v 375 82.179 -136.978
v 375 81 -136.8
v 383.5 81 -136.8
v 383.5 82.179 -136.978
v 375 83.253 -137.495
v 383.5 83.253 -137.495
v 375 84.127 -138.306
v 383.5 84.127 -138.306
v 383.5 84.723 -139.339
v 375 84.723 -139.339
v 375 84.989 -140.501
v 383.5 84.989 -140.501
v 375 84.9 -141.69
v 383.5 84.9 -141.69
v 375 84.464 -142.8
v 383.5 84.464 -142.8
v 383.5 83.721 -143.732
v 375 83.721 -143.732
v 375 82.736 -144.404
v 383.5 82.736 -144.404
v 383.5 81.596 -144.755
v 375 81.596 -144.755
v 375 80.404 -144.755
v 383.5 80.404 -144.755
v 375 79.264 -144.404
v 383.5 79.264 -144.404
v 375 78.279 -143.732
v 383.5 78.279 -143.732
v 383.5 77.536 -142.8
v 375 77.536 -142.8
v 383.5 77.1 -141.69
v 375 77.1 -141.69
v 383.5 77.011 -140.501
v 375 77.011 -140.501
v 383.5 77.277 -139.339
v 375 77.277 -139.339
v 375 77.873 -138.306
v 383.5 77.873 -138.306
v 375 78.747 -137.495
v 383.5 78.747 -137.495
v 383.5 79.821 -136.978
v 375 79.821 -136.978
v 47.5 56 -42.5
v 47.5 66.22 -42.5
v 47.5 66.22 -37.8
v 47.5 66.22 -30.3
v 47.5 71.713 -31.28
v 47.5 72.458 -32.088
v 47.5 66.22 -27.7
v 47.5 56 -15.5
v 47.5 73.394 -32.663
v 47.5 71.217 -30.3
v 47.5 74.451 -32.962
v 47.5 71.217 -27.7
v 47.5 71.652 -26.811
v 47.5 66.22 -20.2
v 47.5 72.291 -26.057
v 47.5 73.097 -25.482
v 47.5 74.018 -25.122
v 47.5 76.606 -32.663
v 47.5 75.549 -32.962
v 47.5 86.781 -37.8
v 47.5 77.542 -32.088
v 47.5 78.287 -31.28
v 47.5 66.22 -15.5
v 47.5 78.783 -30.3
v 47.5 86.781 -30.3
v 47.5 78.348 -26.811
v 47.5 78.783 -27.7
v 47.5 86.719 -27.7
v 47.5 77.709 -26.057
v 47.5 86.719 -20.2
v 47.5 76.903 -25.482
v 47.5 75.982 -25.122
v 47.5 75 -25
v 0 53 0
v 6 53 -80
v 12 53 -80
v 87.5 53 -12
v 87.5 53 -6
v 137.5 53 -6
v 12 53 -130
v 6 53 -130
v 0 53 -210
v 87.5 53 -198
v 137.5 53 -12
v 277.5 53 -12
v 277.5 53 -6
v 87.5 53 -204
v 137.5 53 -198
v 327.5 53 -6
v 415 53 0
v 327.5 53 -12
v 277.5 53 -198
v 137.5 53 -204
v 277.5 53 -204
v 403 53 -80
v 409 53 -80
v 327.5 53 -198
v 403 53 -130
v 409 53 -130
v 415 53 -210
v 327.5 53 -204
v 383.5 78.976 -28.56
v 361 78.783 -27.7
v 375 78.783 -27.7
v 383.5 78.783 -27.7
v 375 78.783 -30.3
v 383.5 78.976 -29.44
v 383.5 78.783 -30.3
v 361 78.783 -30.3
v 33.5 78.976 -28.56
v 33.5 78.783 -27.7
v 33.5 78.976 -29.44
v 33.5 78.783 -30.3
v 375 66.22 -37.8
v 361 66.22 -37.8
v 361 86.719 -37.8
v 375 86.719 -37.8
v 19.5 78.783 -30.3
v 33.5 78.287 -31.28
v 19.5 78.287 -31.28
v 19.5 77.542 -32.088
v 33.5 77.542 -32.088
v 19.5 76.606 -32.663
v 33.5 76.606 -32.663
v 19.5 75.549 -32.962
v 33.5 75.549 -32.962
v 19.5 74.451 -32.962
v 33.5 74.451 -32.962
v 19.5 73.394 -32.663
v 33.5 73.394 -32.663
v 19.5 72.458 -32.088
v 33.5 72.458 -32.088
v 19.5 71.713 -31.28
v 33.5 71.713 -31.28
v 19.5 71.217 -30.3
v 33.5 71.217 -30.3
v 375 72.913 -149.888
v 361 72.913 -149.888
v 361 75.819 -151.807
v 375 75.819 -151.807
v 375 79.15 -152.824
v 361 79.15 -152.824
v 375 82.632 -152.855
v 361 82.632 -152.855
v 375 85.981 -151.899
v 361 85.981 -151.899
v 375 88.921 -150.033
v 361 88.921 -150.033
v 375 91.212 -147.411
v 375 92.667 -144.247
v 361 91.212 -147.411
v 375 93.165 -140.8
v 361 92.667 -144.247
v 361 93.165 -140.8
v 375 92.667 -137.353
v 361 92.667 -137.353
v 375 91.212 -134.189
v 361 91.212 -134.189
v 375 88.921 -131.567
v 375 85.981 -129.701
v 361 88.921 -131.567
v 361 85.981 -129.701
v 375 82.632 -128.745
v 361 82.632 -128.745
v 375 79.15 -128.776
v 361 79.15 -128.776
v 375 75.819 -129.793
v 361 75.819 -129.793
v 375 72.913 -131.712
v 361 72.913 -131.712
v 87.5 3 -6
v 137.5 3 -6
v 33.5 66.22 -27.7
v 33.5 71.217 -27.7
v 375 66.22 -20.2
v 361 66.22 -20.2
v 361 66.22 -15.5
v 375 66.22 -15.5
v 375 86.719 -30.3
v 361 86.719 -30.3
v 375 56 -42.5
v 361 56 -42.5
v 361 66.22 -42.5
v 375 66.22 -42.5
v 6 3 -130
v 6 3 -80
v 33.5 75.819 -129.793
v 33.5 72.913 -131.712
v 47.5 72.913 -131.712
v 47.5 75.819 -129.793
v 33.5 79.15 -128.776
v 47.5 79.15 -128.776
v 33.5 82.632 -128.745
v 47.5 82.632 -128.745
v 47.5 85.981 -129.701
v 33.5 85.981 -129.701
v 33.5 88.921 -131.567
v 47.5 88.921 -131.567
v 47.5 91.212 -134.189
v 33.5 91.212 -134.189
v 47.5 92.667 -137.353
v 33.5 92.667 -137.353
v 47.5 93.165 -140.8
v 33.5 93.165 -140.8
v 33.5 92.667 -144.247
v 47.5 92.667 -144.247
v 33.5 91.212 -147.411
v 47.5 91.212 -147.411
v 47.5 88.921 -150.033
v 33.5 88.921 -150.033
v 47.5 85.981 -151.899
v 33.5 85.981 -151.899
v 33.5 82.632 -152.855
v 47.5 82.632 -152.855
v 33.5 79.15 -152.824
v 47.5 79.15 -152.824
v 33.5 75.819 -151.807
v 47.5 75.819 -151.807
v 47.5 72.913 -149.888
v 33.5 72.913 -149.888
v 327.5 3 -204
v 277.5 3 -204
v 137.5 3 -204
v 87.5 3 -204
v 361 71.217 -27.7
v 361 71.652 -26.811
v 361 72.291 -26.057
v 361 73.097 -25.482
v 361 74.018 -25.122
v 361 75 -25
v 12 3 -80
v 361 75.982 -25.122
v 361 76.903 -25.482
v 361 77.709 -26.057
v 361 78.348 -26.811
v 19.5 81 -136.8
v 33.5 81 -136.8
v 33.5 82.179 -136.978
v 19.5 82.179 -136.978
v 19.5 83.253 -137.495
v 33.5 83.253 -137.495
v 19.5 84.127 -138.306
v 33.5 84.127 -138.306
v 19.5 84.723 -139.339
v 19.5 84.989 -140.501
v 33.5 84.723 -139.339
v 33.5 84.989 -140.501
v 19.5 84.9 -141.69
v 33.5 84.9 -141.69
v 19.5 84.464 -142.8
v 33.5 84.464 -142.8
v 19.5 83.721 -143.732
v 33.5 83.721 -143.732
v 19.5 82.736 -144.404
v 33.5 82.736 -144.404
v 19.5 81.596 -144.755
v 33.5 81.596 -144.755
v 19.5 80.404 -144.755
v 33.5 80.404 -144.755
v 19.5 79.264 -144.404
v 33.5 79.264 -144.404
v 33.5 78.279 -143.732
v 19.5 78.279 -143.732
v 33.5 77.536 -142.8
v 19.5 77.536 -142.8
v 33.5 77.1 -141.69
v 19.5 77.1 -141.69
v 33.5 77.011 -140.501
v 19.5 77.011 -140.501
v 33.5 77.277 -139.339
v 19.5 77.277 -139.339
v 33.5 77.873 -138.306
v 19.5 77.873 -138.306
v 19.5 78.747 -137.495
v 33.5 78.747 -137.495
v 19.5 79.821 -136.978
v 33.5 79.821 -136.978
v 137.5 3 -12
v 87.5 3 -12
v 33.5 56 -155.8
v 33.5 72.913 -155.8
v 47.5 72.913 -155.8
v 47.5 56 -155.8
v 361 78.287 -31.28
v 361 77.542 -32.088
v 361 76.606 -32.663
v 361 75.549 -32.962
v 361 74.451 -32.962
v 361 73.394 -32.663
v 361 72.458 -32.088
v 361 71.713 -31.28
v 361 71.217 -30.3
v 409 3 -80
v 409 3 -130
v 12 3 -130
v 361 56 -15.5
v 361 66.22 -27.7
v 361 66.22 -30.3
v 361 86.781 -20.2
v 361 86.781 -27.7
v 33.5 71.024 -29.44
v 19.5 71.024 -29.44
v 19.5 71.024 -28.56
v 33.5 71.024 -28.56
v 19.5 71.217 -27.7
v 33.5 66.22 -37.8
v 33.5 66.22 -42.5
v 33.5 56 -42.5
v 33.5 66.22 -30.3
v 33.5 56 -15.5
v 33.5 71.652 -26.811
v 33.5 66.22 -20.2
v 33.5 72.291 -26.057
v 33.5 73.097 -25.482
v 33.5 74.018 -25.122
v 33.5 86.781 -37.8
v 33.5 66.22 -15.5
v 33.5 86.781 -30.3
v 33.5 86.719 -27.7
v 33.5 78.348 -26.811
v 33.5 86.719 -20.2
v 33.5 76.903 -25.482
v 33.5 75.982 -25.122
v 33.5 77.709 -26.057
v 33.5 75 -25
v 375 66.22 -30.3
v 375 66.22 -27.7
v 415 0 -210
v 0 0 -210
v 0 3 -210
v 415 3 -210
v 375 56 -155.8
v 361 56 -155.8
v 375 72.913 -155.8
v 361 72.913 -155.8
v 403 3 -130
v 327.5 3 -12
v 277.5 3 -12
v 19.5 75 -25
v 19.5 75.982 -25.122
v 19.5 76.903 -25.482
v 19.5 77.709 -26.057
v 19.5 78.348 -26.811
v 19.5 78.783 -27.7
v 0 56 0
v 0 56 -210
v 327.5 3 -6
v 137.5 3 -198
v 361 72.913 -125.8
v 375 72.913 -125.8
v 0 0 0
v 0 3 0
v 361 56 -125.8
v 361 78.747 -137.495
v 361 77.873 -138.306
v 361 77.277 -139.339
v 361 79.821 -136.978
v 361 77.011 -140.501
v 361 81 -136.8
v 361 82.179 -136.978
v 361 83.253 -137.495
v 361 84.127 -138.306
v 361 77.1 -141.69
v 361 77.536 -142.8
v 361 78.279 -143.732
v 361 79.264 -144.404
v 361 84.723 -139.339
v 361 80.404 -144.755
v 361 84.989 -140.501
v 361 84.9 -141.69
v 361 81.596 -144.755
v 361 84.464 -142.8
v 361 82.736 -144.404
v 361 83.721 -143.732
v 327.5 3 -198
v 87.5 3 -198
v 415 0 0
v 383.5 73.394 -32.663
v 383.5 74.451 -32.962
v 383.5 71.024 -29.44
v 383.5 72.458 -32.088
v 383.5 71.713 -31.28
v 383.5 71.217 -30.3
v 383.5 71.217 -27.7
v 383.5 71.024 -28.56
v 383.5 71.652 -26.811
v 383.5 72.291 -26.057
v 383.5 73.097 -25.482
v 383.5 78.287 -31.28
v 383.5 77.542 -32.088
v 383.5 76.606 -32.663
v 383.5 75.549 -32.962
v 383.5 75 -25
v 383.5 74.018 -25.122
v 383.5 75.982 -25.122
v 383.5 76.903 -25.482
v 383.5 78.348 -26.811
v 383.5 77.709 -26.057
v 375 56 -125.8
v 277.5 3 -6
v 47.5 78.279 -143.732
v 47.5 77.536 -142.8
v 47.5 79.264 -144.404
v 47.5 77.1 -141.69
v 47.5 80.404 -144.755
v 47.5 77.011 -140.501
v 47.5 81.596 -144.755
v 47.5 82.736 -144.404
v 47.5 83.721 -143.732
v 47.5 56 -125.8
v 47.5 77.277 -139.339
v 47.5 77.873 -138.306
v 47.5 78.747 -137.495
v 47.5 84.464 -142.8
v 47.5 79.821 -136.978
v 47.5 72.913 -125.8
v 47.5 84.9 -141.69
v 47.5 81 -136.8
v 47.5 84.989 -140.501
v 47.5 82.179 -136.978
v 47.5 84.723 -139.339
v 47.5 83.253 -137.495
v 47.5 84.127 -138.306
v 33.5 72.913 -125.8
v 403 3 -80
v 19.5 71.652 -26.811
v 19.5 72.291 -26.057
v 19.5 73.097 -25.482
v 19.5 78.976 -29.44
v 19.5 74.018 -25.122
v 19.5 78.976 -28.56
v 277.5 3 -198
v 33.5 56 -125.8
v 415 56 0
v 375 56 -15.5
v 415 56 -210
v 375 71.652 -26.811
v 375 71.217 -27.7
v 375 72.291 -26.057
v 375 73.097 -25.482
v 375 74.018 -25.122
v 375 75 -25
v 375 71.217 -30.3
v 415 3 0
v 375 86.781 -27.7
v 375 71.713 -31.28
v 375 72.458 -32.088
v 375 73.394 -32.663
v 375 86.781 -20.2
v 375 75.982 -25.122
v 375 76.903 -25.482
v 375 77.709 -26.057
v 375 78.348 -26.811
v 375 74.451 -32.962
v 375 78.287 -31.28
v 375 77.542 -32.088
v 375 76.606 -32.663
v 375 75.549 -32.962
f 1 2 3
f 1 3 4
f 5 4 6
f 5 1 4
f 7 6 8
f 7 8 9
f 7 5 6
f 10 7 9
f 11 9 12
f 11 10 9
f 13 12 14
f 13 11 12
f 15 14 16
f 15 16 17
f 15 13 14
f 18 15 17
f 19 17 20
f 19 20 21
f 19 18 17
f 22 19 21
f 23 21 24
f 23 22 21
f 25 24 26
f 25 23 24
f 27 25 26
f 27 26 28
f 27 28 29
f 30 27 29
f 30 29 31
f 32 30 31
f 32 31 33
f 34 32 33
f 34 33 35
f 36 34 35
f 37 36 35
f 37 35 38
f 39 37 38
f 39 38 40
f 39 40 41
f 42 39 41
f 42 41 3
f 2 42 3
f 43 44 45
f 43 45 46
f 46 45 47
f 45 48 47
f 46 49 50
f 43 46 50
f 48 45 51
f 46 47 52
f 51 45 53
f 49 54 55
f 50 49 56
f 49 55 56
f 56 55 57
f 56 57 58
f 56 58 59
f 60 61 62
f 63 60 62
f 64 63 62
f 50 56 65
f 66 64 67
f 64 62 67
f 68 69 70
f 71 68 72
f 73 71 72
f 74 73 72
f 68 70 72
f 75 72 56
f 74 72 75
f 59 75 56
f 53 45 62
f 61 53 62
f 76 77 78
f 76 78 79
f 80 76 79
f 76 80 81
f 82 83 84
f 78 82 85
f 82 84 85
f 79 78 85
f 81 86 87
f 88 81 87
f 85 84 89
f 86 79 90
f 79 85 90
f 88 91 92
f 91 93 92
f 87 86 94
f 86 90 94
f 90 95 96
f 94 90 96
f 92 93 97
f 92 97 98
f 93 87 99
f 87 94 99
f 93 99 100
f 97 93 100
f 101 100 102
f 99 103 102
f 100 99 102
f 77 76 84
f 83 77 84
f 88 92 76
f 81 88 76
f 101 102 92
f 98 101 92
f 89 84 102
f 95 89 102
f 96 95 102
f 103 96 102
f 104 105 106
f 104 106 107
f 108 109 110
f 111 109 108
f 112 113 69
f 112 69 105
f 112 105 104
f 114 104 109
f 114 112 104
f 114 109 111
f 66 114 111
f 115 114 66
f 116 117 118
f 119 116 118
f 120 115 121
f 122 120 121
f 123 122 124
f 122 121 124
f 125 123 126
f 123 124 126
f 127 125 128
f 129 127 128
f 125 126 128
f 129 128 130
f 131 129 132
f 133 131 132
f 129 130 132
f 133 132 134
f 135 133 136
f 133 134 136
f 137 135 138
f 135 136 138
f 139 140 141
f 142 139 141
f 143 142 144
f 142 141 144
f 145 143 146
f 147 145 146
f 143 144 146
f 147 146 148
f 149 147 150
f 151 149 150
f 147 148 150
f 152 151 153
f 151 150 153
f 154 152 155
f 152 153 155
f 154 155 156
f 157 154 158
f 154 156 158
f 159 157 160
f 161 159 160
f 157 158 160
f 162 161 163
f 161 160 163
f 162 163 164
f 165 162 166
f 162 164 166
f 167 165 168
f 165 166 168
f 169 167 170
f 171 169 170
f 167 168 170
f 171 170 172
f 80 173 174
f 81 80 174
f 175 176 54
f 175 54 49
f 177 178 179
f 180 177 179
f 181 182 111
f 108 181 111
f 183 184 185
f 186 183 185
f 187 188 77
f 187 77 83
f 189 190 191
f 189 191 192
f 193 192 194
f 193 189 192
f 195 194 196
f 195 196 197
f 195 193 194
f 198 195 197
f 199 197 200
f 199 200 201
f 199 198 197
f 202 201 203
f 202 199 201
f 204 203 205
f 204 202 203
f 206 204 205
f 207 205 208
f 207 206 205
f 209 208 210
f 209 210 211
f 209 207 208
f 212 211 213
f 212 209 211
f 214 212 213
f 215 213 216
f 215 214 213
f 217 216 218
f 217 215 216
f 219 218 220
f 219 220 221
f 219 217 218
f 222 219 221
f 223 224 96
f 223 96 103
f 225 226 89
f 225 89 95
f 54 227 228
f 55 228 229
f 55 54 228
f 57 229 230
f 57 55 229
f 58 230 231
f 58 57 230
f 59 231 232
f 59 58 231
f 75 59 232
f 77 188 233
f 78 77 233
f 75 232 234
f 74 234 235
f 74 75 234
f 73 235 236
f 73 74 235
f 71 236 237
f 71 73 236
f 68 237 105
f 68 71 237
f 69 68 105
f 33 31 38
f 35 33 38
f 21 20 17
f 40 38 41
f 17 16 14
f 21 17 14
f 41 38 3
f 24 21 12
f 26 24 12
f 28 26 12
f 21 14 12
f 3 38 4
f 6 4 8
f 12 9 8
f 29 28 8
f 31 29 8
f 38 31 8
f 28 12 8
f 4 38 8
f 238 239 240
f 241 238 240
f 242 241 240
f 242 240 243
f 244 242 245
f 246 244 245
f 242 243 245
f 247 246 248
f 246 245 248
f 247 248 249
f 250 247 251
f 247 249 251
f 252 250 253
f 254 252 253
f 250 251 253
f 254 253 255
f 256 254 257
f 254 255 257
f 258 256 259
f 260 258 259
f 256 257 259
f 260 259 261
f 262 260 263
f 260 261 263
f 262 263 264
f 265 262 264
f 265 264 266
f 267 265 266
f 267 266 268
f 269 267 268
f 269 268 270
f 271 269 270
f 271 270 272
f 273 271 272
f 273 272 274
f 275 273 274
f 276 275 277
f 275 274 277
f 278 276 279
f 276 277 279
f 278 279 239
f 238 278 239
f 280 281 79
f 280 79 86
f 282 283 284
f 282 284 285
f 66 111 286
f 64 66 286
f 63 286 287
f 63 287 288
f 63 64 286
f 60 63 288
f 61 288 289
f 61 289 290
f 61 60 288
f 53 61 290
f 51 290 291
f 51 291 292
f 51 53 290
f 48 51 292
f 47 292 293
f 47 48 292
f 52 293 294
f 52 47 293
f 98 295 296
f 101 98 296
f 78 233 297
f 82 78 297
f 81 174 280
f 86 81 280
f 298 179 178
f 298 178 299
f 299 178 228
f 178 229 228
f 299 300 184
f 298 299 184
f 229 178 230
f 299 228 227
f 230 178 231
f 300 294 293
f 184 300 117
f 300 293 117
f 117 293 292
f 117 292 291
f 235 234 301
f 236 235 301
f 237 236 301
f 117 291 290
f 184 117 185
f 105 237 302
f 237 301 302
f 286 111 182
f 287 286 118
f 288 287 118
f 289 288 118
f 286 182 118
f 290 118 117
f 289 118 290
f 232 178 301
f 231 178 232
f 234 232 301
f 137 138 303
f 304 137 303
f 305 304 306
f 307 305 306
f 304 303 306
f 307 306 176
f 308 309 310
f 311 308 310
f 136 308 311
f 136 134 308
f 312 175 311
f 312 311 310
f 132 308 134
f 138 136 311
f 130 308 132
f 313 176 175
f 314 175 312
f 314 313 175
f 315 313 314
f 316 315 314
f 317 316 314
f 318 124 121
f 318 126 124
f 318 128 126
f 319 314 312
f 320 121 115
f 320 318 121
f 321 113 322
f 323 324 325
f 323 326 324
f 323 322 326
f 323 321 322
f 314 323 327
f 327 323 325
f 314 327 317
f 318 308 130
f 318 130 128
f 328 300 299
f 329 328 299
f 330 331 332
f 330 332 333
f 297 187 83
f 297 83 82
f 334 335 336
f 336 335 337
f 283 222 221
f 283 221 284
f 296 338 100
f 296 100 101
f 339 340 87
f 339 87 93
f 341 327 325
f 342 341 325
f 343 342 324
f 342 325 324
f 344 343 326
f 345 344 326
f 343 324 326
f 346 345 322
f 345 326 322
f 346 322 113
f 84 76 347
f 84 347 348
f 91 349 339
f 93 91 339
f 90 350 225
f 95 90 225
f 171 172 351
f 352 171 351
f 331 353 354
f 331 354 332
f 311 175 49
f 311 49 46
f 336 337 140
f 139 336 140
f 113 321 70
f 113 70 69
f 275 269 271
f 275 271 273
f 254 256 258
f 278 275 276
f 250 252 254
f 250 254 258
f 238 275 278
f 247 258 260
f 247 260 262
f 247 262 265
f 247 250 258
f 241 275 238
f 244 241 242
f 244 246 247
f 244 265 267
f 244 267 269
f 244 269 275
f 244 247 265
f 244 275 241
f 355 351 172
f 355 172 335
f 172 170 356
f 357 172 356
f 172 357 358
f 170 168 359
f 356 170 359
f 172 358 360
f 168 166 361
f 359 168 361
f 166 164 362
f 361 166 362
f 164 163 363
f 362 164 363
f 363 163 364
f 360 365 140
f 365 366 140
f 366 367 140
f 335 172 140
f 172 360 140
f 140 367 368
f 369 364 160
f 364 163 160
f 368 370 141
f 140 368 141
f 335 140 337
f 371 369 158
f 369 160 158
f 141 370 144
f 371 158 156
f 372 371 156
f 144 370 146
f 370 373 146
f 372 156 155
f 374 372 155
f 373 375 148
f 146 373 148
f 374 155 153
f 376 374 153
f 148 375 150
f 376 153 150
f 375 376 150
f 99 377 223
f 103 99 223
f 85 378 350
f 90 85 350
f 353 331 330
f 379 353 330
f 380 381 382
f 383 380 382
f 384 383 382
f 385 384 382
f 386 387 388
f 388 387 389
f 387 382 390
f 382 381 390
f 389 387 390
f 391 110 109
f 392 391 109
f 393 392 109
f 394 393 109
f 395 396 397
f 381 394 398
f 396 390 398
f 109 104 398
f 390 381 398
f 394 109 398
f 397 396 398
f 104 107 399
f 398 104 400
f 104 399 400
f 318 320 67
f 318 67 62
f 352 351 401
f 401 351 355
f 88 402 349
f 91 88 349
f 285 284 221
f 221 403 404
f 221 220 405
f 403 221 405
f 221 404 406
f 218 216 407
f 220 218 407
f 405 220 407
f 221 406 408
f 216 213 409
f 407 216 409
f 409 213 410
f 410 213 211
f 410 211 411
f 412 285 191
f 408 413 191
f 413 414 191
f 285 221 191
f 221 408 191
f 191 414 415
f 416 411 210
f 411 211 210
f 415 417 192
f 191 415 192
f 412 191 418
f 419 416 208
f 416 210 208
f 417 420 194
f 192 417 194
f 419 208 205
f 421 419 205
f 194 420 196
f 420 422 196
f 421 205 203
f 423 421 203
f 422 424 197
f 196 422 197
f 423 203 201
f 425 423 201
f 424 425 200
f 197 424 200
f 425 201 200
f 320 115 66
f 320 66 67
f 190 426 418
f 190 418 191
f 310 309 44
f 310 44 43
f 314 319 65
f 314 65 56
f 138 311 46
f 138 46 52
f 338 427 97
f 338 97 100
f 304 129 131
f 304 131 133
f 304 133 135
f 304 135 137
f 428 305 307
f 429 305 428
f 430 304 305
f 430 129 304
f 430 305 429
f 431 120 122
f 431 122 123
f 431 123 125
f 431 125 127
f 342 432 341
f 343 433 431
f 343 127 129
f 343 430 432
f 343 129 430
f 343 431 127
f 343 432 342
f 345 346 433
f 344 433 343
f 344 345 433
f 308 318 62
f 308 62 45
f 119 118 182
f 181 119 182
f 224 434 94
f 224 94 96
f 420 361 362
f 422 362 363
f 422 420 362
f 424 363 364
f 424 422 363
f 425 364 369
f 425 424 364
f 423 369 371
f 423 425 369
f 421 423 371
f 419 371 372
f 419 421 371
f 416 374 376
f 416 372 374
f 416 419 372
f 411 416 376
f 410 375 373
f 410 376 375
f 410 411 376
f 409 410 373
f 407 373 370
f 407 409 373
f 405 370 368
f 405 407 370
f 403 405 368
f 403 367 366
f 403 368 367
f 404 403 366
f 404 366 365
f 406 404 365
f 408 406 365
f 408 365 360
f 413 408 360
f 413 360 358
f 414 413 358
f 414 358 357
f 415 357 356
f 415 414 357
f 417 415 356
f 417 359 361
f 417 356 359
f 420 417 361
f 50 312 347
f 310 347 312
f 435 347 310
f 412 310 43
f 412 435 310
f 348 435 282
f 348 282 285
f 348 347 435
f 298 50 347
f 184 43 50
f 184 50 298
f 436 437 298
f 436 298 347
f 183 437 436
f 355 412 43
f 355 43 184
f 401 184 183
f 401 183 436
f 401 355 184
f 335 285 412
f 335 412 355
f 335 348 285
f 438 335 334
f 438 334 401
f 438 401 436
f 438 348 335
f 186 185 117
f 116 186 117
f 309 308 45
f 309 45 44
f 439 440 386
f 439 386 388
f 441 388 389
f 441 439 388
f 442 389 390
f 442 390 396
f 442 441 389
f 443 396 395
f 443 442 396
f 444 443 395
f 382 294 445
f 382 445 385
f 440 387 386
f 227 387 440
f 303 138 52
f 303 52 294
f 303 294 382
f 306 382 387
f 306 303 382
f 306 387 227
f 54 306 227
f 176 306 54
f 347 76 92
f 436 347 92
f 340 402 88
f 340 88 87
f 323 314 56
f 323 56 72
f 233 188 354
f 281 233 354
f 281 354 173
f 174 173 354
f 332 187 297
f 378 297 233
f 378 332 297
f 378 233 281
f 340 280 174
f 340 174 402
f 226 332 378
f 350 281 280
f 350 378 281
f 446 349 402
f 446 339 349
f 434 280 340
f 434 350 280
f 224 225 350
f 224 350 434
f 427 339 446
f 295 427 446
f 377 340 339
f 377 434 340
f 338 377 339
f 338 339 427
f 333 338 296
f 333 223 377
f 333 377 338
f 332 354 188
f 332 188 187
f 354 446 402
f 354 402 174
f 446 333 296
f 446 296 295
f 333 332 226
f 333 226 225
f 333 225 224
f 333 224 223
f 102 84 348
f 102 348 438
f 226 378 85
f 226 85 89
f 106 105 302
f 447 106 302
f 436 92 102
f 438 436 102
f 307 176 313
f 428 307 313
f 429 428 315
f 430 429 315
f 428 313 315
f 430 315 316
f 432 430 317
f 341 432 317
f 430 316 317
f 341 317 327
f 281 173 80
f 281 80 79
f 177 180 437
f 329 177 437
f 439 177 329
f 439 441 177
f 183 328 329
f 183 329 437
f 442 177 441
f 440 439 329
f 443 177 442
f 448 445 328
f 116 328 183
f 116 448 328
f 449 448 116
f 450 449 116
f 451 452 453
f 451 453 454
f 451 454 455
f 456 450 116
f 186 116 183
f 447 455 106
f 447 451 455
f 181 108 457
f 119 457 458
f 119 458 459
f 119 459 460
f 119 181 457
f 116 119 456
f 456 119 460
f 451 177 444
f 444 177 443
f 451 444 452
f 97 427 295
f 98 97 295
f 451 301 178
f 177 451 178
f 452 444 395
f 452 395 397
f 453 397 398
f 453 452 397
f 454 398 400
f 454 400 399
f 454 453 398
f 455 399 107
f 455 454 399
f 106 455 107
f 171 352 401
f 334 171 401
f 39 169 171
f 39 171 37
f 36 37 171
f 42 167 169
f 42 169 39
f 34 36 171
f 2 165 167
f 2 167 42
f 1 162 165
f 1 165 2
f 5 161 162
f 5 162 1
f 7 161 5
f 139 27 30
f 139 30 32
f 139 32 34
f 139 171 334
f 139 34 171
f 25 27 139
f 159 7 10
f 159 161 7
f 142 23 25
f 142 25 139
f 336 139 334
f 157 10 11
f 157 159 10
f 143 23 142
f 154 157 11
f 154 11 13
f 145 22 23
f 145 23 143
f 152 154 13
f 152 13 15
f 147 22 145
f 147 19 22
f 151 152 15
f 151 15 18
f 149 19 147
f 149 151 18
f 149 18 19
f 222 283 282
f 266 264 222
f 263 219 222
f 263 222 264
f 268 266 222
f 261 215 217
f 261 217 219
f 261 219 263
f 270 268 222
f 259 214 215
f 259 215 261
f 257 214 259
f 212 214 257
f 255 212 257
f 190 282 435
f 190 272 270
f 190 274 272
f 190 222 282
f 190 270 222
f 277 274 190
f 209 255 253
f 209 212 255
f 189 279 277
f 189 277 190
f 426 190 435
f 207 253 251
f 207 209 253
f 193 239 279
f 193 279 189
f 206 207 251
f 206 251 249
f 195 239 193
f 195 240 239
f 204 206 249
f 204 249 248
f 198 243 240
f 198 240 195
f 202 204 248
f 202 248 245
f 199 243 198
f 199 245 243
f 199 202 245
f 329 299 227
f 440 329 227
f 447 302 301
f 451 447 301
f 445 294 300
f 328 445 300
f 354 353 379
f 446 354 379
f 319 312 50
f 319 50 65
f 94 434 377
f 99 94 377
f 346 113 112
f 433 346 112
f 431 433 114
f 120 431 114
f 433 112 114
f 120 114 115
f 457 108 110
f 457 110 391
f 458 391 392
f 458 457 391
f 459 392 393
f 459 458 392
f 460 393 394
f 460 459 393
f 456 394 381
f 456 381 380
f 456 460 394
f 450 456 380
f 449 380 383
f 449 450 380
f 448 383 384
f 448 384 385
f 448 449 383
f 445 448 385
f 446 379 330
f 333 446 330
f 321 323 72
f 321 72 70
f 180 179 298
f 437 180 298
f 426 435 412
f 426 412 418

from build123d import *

# Parameters (mm, degrees)
SKETCH2_W           = 415
SKETCH2_H           = 210
BOSS_EXTRUDE1_DEPTH = 3
SKETCH3_W           = 415
SKETCH3_H           = 210
BOSS_EXTRUDE2_DEPTH = 3
BOSS_EXTRUDE3_REACH = 470.118
SKETCH4_W           = 6
SKETCH4_H           = 50
SKETCH4_W_2         = 50
SKETCH4_H_2         = 6
BOSS_EXTRUDE4_DEPTH = 14
SKETCH5_3_R         = 4
BOSS_EXTRUDE5_DEPTH = 350
SKETCH8_R           = 4
BOSS_EXTRUDE6_DEPTH = 14
SKETCH5_4_R         = 4
BOSS_EXTRUDE7_DEPTH = 14


with BuildPart() as part:
    # Sketch2 → Boss-Extrude1 (new body)
    with BuildSketch(Plane(origin=(0, 0, 0), x_dir=(1, 0, 0), z_dir=(0, 1, 0))):
        with Locations((207.5, 105)):
            Rectangle(SKETCH2_W, SKETCH2_H)
    extrude(amount=BOSS_EXTRUDE1_DEPTH)


with BuildPart() as body_2:
    # Sketch3 → Boss-Extrude2 (new body)
    with BuildSketch(Plane(origin=(0, 53, 0), x_dir=(1, 0, 0), z_dir=(0, 1, 0))):
        with Locations((207.5, 105)):
            Rectangle(SKETCH3_W, SKETCH3_H)
    extrude(amount=BOSS_EXTRUDE2_DEPTH)

    # Sketch4 → Boss-Extrude3 (add, up to next)
    with BuildSketch(Plane(origin=(0, 3, 0), x_dir=(1, 0, 0), z_dir=(0, 1, 0)), mode=Mode.PRIVATE) as boss_extrude3_sk1:
        with Locations((9, 105)):
            Rectangle(SKETCH4_W, SKETCH4_H)
    boss_extrude3_tool1 = extrude(boss_extrude3_sk1.sketch, amount=BOSS_EXTRUDE3_REACH, mode=Mode.PRIVATE) - body_2.part
    # Sketch4 → Boss-Extrude3 (add, up to next)
    with BuildSketch(Plane(origin=(0, 3, 0), x_dir=(1, 0, 0), z_dir=(0, 1, 0)), mode=Mode.PRIVATE) as boss_extrude3_sk2:
        with Locations((112.5, 9)):
            Rectangle(SKETCH4_W_2, SKETCH4_H_2)
    boss_extrude3_tool2 = extrude(boss_extrude3_sk2.sketch, amount=BOSS_EXTRUDE3_REACH, mode=Mode.PRIVATE) - body_2.part
    # Sketch4 → Boss-Extrude3 (add, up to next)
    with BuildSketch(Plane(origin=(0, 3, 0), x_dir=(1, 0, 0), z_dir=(0, 1, 0)), mode=Mode.PRIVATE) as boss_extrude3_sk3:
        with Locations((302.5, 9)):
            Rectangle(SKETCH4_W_2, SKETCH4_H_2)
    boss_extrude3_tool3 = extrude(boss_extrude3_sk3.sketch, amount=BOSS_EXTRUDE3_REACH, mode=Mode.PRIVATE) - body_2.part
    # Sketch4 → Boss-Extrude3 (add, up to next)
    with BuildSketch(Plane(origin=(0, 3, 0), x_dir=(1, 0, 0), z_dir=(0, 1, 0)), mode=Mode.PRIVATE) as boss_extrude3_sk4:
        with Locations((406, 105)):
            Rectangle(SKETCH4_W, SKETCH4_H)
    boss_extrude3_tool4 = extrude(boss_extrude3_sk4.sketch, amount=BOSS_EXTRUDE3_REACH, mode=Mode.PRIVATE) - body_2.part
    # Sketch4 → Boss-Extrude3 (add, up to next)
    with BuildSketch(Plane(origin=(0, 3, 0), x_dir=(1, 0, 0), z_dir=(0, 1, 0)), mode=Mode.PRIVATE) as boss_extrude3_sk5:
        with Locations((302.5, 201)):
            Rectangle(SKETCH4_W_2, SKETCH4_H_2)
    boss_extrude3_tool5 = extrude(boss_extrude3_sk5.sketch, amount=BOSS_EXTRUDE3_REACH, mode=Mode.PRIVATE) - body_2.part
    # Sketch4 → Boss-Extrude3 (add, up to next)
    with BuildSketch(Plane(origin=(0, 3, 0), x_dir=(1, 0, 0), z_dir=(0, 1, 0)), mode=Mode.PRIVATE) as boss_extrude3_sk6:
        with Locations((112.5, 201)):
            Rectangle(SKETCH4_W_2, SKETCH4_H_2)
    boss_extrude3_tool6 = extrude(boss_extrude3_sk6.sketch, amount=BOSS_EXTRUDE3_REACH, mode=Mode.PRIVATE) - body_2.part

    add(part.part)  # Boss-Extrude3 merges part
    add(boss_extrude3_tool1.solids().sort_by_distance((9, 3, -105))[0])
    add(boss_extrude3_tool2.solids().sort_by_distance((112.5, 3, -9))[0])
    add(boss_extrude3_tool3.solids().sort_by_distance((302.5, 3, -9))[0])
    add(boss_extrude3_tool4.solids().sort_by_distance((406, 3, -105))[0])
    add(boss_extrude3_tool5.solids().sort_by_distance((302.5, 3, -201))[0])
    add(boss_extrude3_tool6.solids().sort_by_distance((112.5, 3, -201))[0])

    # Sketch5 → Boss-Extrude4 (add)
    with BuildSketch(Plane.ZY.offset(-33.5)):
        with BuildLine():
            Line((-20.2, 66.220460186), (-20.2, 86.719329946))
            Line((-20.2, 86.719329946), (-27.7, 86.719329946))
            Line((-27.7, 86.719329946), (-27.7, 78.782856064))
            ThreePointArc((-27.7, 78.782856064), (-25, 75), (-27.7, 71.217143936))
            Line((-27.7, 71.217143936), (-27.7, 66.220460186))
            Line((-27.7, 66.220460186), (-30.3, 66.220460186))
            Line((-30.3, 66.220460186), (-30.3, 71.217143936))
            ThreePointArc((-30.3, 71.217143936), (-33, 75), (-30.3, 78.782856064))
            Line((-30.3, 78.782856064), (-30.3, 86.780809456))
            Line((-30.3, 86.780809456), (-37.8, 86.780809456))
            Line((-37.8, 86.780809456), (-37.8, 66.220460186))
            Line((-37.8, 66.220460186), (-42.5, 66.220460186))
            Line((-42.5, 66.220460186), (-42.5, 56))
            Line((-42.5, 56), (-15.5, 56))
            Line((-15.5, 56), (-15.5, 66.220460186))
            Line((-15.5, 66.220460186), (-20.2, 66.220460186))
        make_face()
        with BuildLine():
            Line((-149.888097116, 72.9128735), (-155.8, 72.9128735))
            Line((-155.8, 72.9128735), (-155.8, 56))
            Line((-155.8, 56), (-125.8, 56))
            Line((-125.8, 56), (-125.8, 72.9128735))
            Line((-125.8, 72.9128735), (-131.711902884, 72.9128735))
            ThreePointArc((-131.711902884, 72.9128735), (-140.8, 93.165324665), (-149.888097116, 72.9128735))
        make_face()
    extrude(amount=-BOSS_EXTRUDE4_DEPTH)

    # Sketch5<3> → Boss-Extrude5 (add)
    with BuildSketch(Plane.ZY.offset(-33.5)):
        with Locations((-29, 75)):
            Circle(SKETCH5_3_R)
        with Locations((-140.8, 81)):
            Circle(SKETCH5_3_R)
    extrude(amount=-BOSS_EXTRUDE5_DEPTH)

    # Sketch8 → Boss-Extrude6 (add)
    # profile 1 of 2: a face of its own
    with BuildSketch(Plane(origin=(361, 0, 0), x_dir=(0, 0, -1), z_dir=(1, 0, 0))):
        with BuildLine():
            Line((37.8, 66.220460186), (37.8, 86.719329946))
            Line((37.8, 86.719329946), (30.3, 86.719329946))
            Line((30.3, 86.719329946), (30.3, 78.782856064))
            ThreePointArc((30.3, 78.782856064), (33, 75), (30.3, 71.217143936))
            Line((30.3, 71.217143936), (30.3, 66.220460186))
            Line((30.3, 66.220460186), (27.7, 66.220460186))
            Line((27.7, 66.220460186), (27.7, 86.780809456))
            Line((27.7, 86.780809456), (20.2, 86.780809456))
            Line((20.2, 86.780809456), (20.2, 66.220460186))
            Line((20.2, 66.220460186), (15.5, 66.220460186))
            Line((15.5, 66.220460186), (15.5, 56))
            Line((15.5, 56), (42.5, 56))
            Line((42.5, 56), (42.5, 66.220460186))
            Line((42.5, 66.220460186), (37.8, 66.220460186))
        make_face()
    # profile 2 of 2: a face of its own
    with BuildSketch(Plane(origin=(361, 0, 0), x_dir=(0, 0, -1), z_dir=(1, 0, 0))):
        with BuildLine():
            Line((131.711902884, 72.9128735), (125.8, 72.9128735))
            Line((125.8, 72.9128735), (125.8, 56))
            Line((125.8, 56), (155.8, 56))
            Line((155.8, 56), (155.8, 72.9128735))
            Line((155.8, 72.9128735), (149.888097116, 72.9128735))
            ThreePointArc((149.888097116, 72.9128735), (140.8, 93.165324665), (131.711902884, 72.9128735))
        make_face()
        with Locations((140.8, 81)):
            Circle(SKETCH8_R, mode=Mode.SUBTRACT)
    extrude(amount=BOSS_EXTRUDE6_DEPTH)

    # Sketch5<4> → Boss-Extrude7 (add)
    with BuildSketch(Plane.ZY.offset(-33.5)):
        with Locations((-29, 75)):
            Circle(SKETCH5_4_R)
        with Locations((-140.8, 81)):
            Circle(SKETCH5_4_R)
    extrude(amount=BOSS_EXTRUDE7_DEPTH)


solid = body_2.part
